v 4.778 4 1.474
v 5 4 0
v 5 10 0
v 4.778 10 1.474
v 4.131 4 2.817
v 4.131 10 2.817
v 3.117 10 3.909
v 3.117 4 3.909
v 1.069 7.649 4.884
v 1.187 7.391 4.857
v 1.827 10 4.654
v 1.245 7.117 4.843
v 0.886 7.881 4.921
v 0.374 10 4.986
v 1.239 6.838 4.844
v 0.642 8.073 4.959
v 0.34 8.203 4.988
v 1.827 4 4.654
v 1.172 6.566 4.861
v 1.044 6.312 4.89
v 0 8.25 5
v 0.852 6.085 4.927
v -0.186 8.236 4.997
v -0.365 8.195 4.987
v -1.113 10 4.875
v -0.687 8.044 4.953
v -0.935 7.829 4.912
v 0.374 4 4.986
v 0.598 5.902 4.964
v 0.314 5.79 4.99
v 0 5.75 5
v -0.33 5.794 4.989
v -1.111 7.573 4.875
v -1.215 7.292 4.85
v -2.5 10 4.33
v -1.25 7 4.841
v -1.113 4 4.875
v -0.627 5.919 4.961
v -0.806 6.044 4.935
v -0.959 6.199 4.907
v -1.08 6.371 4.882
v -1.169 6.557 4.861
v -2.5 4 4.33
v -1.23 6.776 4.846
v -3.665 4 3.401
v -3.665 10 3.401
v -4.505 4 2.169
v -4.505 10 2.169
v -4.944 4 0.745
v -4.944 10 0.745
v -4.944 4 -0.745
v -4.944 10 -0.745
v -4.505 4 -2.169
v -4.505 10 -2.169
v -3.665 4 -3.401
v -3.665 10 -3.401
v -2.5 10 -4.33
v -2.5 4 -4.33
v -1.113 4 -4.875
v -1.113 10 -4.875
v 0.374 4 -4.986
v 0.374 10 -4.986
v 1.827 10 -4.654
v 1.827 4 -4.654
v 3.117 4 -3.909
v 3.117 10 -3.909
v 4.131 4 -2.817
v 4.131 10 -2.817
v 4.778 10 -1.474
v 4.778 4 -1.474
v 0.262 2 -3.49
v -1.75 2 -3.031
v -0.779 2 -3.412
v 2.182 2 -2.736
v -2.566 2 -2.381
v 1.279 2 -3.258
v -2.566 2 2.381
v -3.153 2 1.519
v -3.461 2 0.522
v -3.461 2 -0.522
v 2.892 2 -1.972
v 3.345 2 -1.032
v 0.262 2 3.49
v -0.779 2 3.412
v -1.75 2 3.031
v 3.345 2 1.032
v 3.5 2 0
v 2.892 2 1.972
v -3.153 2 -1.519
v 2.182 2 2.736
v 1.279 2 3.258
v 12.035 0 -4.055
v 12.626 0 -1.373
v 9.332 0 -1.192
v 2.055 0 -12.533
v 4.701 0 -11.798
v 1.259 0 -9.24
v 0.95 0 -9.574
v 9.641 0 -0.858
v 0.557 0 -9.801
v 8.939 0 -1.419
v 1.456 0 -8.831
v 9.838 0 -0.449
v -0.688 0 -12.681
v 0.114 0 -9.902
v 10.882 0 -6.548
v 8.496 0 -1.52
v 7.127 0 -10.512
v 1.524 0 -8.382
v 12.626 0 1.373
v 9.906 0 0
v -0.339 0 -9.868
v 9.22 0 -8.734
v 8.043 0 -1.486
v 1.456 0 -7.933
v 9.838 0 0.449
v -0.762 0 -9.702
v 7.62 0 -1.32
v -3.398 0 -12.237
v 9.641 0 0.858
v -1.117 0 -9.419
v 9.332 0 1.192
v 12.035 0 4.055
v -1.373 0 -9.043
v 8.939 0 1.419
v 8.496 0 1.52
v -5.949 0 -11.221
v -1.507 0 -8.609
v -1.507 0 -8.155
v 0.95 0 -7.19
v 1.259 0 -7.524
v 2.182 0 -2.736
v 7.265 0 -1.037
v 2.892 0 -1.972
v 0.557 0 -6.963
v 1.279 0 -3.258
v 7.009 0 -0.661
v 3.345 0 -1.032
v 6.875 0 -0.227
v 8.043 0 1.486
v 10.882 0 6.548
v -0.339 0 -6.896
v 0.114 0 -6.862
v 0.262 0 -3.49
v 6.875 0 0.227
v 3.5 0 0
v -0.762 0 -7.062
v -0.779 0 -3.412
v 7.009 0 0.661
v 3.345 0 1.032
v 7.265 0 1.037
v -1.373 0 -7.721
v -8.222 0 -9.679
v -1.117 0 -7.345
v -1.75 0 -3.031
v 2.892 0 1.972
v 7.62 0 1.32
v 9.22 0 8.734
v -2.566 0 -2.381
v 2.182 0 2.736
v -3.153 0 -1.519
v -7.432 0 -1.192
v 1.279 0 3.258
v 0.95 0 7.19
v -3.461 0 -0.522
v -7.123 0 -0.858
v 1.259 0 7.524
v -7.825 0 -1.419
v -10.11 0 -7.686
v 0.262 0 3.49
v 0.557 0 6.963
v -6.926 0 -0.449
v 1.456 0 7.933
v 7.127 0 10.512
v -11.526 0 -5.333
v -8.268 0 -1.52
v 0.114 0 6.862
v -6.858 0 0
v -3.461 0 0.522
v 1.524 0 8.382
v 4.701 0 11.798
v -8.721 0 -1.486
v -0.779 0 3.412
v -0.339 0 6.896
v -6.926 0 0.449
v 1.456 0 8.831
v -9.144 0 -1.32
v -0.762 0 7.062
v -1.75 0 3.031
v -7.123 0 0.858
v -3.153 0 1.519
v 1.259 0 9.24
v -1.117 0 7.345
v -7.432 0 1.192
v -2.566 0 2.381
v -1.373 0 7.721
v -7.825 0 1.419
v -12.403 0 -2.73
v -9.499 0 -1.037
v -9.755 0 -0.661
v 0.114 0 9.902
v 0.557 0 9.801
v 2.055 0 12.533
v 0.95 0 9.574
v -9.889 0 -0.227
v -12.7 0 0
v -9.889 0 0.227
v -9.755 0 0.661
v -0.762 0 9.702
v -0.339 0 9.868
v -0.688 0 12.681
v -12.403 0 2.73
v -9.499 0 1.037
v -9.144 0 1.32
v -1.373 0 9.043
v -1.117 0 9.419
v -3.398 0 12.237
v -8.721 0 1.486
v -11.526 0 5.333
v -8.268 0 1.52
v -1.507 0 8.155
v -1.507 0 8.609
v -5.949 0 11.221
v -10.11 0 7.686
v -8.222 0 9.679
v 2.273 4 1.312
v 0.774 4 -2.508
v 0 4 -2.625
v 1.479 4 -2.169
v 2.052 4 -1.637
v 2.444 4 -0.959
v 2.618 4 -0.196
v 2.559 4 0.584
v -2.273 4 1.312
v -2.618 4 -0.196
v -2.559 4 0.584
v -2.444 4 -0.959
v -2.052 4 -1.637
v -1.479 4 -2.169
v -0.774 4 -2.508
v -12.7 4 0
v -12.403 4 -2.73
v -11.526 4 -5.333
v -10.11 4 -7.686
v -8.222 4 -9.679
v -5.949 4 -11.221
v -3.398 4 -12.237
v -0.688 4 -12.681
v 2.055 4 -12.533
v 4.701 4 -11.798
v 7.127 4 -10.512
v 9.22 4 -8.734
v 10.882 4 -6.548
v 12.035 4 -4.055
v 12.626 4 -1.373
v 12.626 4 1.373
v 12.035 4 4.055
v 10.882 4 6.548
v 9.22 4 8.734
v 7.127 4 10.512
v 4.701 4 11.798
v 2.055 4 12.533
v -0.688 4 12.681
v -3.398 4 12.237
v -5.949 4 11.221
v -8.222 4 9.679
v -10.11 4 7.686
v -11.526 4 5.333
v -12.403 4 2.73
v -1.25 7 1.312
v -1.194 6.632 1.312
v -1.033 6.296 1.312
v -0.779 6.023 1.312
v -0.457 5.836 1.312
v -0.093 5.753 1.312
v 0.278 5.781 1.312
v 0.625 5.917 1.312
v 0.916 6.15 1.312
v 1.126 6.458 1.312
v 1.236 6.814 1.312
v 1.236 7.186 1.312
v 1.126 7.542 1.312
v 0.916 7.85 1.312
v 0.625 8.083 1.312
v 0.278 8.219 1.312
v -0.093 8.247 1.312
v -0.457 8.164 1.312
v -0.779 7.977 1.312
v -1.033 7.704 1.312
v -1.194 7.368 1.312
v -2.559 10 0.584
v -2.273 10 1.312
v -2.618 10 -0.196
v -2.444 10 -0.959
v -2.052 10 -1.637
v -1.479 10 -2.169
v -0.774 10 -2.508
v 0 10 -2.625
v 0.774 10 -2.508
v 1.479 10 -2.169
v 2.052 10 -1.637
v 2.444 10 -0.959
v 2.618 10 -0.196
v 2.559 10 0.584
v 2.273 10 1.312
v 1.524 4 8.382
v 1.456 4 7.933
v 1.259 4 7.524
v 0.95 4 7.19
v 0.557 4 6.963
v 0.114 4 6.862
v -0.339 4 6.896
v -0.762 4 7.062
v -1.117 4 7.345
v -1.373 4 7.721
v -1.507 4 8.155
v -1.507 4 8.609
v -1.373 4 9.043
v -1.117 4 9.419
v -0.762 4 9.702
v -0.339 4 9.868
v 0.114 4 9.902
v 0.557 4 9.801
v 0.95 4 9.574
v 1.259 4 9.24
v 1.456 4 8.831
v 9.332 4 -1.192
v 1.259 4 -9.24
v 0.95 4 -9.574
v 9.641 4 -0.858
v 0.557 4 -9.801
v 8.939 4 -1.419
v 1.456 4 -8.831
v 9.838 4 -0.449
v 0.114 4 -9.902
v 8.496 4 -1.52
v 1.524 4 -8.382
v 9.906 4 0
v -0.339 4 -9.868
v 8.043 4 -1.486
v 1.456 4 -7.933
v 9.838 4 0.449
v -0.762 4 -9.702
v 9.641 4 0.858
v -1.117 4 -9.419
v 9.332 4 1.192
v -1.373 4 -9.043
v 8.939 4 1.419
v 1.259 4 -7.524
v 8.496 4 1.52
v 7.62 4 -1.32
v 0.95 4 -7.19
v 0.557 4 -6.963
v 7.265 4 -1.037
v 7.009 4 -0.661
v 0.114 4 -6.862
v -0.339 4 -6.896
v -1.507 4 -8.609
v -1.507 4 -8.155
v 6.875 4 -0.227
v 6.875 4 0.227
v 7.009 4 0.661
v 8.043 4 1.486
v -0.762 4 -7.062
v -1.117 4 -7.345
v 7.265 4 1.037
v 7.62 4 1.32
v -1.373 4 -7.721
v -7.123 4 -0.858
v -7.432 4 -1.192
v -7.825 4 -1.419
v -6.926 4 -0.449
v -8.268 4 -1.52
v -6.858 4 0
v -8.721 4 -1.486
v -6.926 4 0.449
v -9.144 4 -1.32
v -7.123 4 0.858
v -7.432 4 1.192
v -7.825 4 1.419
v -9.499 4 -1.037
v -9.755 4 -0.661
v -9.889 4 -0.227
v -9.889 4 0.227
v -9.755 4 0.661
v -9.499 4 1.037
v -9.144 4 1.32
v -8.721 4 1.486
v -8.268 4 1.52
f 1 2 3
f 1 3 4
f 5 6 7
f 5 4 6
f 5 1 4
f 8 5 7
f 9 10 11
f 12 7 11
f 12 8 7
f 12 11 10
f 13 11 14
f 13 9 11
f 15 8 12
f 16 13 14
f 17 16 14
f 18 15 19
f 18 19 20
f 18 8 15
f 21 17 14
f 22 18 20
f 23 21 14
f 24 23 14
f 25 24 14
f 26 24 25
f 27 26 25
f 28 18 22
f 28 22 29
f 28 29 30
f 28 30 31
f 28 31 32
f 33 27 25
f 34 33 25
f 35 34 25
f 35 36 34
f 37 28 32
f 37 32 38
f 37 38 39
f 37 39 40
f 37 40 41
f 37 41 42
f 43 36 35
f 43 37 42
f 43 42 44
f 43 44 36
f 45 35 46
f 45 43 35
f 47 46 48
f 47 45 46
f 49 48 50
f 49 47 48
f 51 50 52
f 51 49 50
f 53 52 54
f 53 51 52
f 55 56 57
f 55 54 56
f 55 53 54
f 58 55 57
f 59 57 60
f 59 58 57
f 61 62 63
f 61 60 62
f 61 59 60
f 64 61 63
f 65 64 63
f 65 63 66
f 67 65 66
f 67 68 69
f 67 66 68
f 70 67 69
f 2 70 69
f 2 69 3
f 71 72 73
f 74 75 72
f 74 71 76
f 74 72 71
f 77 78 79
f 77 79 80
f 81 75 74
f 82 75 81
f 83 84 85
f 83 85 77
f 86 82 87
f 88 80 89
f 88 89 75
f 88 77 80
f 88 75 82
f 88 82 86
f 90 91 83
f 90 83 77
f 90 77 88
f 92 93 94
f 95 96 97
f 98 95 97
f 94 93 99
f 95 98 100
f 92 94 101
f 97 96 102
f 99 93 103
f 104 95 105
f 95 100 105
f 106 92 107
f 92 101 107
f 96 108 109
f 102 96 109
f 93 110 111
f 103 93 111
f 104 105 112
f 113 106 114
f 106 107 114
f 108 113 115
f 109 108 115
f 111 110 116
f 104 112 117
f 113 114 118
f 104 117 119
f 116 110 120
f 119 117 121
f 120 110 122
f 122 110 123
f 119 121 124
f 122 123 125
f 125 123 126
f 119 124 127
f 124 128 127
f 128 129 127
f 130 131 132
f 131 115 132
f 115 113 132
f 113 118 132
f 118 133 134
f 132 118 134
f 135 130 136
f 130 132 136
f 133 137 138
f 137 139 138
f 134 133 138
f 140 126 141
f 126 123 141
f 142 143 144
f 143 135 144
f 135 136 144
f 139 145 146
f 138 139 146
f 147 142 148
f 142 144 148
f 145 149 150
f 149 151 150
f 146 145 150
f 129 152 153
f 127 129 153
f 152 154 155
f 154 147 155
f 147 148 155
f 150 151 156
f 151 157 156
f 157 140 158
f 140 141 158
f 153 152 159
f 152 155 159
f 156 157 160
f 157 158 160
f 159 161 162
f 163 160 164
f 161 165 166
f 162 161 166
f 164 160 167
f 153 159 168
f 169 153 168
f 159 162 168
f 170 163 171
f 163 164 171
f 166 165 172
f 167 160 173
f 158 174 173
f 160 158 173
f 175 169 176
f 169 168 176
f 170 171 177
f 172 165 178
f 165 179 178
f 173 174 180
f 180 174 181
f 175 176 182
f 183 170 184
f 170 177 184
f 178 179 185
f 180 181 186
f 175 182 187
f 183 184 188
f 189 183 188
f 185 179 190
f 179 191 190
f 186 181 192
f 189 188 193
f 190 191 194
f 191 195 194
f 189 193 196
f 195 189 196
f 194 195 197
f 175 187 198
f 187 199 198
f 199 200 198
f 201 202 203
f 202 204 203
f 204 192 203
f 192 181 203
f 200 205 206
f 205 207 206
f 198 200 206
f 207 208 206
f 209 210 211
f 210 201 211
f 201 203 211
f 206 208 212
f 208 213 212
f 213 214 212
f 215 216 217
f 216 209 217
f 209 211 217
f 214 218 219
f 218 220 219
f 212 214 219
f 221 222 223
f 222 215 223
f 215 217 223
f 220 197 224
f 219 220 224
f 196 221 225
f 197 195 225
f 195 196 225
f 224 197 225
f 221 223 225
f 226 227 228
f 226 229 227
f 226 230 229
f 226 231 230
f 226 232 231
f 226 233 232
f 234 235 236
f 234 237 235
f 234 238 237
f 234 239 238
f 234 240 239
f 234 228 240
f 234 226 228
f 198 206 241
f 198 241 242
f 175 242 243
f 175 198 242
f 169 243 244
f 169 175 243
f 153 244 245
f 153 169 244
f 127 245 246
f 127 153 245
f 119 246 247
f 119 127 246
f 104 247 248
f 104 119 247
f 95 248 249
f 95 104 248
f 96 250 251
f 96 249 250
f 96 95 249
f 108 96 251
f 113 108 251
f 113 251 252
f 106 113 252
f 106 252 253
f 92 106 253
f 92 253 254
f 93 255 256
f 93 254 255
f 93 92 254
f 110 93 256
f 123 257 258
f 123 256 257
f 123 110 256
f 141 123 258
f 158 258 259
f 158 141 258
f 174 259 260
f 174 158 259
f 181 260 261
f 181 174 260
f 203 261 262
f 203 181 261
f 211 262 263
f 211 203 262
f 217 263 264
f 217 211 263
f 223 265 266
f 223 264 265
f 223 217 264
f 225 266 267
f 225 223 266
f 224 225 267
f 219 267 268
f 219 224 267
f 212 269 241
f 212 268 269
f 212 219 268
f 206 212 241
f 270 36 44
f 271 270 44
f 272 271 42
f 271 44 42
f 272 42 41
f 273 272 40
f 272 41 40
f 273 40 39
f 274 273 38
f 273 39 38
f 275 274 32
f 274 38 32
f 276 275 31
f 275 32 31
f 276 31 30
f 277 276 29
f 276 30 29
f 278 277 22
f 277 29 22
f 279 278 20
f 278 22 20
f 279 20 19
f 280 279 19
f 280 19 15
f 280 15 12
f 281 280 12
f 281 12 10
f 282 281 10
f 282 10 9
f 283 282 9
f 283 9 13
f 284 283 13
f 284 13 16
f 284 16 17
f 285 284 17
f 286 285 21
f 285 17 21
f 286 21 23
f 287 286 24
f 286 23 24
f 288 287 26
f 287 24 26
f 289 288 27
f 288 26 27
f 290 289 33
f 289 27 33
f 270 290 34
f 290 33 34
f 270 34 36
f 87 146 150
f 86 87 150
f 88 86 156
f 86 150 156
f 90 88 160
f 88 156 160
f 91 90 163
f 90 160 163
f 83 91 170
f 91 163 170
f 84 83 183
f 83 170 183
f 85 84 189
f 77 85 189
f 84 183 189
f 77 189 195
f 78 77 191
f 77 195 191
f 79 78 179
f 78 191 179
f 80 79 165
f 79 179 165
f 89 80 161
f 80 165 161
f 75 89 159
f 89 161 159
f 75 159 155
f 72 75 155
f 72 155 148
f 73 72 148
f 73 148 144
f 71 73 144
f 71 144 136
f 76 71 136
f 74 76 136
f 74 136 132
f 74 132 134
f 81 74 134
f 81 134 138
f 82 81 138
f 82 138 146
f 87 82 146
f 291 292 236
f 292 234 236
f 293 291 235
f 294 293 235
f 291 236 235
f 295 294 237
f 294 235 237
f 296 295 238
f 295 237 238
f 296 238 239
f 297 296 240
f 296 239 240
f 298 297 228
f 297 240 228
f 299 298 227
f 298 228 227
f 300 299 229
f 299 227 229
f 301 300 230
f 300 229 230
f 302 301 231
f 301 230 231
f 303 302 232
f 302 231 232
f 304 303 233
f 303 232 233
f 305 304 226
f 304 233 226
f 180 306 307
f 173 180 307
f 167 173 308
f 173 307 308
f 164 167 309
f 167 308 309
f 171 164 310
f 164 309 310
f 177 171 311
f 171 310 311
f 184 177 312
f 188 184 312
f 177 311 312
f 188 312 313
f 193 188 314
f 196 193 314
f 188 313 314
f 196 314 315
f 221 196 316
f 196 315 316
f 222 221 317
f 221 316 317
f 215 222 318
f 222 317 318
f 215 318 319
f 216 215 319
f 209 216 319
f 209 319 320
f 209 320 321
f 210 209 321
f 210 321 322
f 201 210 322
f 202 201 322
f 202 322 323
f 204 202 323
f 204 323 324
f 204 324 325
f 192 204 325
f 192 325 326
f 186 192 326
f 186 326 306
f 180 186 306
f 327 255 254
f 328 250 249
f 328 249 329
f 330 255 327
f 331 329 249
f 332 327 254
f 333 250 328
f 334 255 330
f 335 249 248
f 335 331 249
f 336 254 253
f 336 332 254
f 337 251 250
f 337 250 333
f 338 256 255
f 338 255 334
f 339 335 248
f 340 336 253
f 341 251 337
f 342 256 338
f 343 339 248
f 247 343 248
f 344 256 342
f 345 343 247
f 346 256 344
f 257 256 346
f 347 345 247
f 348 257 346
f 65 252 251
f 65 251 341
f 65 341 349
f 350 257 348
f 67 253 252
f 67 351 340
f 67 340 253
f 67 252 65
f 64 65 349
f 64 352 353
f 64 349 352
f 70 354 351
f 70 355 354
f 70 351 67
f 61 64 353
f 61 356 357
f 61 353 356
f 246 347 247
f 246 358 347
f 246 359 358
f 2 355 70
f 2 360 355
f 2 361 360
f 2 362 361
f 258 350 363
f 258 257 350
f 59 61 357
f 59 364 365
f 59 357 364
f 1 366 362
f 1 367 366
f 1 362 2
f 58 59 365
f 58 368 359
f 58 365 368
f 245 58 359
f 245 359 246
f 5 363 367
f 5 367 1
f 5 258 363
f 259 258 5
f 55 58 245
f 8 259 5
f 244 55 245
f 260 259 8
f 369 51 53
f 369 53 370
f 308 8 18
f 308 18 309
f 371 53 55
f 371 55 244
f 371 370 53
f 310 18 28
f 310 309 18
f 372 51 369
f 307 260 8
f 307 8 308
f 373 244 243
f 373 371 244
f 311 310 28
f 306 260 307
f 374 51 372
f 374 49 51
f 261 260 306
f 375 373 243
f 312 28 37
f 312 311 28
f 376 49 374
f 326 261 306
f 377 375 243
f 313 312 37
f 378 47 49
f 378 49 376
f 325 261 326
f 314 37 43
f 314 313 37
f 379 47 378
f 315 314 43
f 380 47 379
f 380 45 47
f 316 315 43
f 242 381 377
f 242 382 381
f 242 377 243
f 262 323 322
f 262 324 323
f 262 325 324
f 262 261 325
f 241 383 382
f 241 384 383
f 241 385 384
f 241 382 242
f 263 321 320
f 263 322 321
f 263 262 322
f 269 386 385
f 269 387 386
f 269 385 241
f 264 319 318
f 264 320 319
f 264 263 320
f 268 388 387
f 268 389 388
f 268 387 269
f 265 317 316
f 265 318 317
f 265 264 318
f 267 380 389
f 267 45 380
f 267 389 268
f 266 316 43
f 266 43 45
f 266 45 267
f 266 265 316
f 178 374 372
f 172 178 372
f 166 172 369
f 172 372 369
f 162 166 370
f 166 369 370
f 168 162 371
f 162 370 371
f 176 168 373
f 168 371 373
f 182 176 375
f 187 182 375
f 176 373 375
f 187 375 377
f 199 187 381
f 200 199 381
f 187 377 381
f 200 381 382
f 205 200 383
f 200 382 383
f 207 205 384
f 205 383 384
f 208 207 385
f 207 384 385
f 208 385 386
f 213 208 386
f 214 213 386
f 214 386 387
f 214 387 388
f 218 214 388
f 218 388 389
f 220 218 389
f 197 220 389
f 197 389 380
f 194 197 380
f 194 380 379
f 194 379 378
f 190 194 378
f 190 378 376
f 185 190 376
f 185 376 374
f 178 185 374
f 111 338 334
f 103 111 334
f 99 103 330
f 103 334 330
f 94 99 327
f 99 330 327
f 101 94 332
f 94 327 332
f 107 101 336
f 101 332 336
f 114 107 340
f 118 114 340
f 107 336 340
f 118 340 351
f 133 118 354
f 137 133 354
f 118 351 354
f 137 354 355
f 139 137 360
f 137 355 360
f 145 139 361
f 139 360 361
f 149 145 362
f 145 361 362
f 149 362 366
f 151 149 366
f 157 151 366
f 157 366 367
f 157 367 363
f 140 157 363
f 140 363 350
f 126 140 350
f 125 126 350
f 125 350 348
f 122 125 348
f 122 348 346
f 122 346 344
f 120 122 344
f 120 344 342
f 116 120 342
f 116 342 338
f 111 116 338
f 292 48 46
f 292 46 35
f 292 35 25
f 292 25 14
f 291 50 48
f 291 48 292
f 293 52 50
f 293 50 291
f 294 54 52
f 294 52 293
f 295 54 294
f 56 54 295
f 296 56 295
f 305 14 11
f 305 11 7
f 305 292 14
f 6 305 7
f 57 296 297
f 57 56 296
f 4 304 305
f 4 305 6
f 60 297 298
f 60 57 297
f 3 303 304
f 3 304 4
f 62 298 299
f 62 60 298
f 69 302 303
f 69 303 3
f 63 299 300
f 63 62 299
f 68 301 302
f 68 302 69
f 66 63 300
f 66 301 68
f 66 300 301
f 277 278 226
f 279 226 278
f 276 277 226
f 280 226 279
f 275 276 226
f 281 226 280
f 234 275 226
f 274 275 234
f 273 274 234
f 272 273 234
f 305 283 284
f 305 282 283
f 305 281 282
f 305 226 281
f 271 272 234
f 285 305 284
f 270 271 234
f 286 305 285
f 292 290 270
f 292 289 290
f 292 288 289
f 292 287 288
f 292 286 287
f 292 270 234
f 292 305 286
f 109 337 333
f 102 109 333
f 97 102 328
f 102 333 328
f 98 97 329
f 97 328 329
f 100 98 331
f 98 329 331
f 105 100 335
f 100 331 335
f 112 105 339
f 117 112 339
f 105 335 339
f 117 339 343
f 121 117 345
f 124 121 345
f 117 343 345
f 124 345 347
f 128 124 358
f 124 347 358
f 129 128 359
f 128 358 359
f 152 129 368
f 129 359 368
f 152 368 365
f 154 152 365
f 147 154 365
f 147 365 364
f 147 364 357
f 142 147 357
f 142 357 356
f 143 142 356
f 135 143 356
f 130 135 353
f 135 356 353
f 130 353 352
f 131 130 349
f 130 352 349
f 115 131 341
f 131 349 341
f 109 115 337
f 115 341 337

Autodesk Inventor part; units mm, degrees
ref_plane "YZ Plane" through (0, 0, 0) normal (1, 0, 0) x (0, 1, 0)
ref_plane "XZ Plane" through (0, 0, 0) normal (0, 1, 0) x (-1, 0, 0)
sketch "Sketch1" plane through (0, 0, 0) normal (0, 1, 0) x (-1, 0, 0)
  circle A0 centre (0, 0) radius 12.7
  dimension "d0" = 25.4
extrude "Extrusion1" add sketch "Sketch1" along normal blind 4
sketch "Sketch2" plane through (0, 4, 0) normal (0, 1, 0) x (1, 0, 0)
  circle A0 centre (0, 8.382) radius 1.524
  circle A1 centre (0, 0) radius 12.7 projected
  circle A2 centre (-8.382, 0) radius 1.524
  circle A3 centre (0, -8.382) radius 1.524
  circle A4 centre (8.382, 0) radius 1.524
  dimension "d7" = 360
extrude "Extrusion2" cut sketch "Sketch2" along normal mid plane 8 contours A0 | A2 | A3 | A4
sketch "Sketch10" plane through (0, 0, 0) normal (0, -1, 0) x (1, 0, 0)
  circle A0 centre (0, 0) radius 12.7 projected
  circle A1 centre (0, 0) radius 3.5
  dimension "d49" = 7
extrude "Extrusion9" cut sketch "Sketch10" against normal blind 2 contours A1
sketch "Sketch11" plane through (0, 4, 0) normal (0, 1, 0) x (1, 0, 0)
  circle A0 centre (0, 0) radius 3.5 projected
  circle A1 centre (0, 0) radius 5
  circle A2 centre (0, 0) radius 2.625
  dimension "d52" = 10
  dimension "d53" = 5.25
extrude "Extrusion10" add sketch "Sketch11" along normal blind 6 contours A0 | A1
sketch "Sketch12" plane through (0, 10, 0) normal (0, 1, 0) x (1, 0, 0)
  line L0 (0, -1.3125) -> (-2.2733, -1.3125)
  circle A0 centre (0, 0) radius 2.625 projected
  arc A1 (-2.2733, -1.3125) -> (2.2733, -1.3125) centre (0, 0) ccw
  line L1 (0, -1.3125) -> (2.2733, -1.3125)
  dimension "d56" = 1.3125
extrude "Extrusion11" add sketch "Sketch12" against normal up to surface (6 mm away) contours L1 A0 L0 picked at (1.3942, -1.4755)
ref_plane "Work Plane1" through (0, 4, 5) normal (0, 0, -1) x (-1, 0, 0)
sketch "Sketch13" plane through (0, 4, 5) normal (0, 0, -1) x (-1, 0, 0)
  line L0 (5, 6) -> (-5, 6) projected
  circle A0 centre (0, 3) radius 1.25
  point P0 (0, -4)
  dimension "d60" = 2.5
extrude "Extrusion12" cut sketch "Sketch13" along normal up to surface (3.6875 mm away)
properties part number "Horn_Attachment"
